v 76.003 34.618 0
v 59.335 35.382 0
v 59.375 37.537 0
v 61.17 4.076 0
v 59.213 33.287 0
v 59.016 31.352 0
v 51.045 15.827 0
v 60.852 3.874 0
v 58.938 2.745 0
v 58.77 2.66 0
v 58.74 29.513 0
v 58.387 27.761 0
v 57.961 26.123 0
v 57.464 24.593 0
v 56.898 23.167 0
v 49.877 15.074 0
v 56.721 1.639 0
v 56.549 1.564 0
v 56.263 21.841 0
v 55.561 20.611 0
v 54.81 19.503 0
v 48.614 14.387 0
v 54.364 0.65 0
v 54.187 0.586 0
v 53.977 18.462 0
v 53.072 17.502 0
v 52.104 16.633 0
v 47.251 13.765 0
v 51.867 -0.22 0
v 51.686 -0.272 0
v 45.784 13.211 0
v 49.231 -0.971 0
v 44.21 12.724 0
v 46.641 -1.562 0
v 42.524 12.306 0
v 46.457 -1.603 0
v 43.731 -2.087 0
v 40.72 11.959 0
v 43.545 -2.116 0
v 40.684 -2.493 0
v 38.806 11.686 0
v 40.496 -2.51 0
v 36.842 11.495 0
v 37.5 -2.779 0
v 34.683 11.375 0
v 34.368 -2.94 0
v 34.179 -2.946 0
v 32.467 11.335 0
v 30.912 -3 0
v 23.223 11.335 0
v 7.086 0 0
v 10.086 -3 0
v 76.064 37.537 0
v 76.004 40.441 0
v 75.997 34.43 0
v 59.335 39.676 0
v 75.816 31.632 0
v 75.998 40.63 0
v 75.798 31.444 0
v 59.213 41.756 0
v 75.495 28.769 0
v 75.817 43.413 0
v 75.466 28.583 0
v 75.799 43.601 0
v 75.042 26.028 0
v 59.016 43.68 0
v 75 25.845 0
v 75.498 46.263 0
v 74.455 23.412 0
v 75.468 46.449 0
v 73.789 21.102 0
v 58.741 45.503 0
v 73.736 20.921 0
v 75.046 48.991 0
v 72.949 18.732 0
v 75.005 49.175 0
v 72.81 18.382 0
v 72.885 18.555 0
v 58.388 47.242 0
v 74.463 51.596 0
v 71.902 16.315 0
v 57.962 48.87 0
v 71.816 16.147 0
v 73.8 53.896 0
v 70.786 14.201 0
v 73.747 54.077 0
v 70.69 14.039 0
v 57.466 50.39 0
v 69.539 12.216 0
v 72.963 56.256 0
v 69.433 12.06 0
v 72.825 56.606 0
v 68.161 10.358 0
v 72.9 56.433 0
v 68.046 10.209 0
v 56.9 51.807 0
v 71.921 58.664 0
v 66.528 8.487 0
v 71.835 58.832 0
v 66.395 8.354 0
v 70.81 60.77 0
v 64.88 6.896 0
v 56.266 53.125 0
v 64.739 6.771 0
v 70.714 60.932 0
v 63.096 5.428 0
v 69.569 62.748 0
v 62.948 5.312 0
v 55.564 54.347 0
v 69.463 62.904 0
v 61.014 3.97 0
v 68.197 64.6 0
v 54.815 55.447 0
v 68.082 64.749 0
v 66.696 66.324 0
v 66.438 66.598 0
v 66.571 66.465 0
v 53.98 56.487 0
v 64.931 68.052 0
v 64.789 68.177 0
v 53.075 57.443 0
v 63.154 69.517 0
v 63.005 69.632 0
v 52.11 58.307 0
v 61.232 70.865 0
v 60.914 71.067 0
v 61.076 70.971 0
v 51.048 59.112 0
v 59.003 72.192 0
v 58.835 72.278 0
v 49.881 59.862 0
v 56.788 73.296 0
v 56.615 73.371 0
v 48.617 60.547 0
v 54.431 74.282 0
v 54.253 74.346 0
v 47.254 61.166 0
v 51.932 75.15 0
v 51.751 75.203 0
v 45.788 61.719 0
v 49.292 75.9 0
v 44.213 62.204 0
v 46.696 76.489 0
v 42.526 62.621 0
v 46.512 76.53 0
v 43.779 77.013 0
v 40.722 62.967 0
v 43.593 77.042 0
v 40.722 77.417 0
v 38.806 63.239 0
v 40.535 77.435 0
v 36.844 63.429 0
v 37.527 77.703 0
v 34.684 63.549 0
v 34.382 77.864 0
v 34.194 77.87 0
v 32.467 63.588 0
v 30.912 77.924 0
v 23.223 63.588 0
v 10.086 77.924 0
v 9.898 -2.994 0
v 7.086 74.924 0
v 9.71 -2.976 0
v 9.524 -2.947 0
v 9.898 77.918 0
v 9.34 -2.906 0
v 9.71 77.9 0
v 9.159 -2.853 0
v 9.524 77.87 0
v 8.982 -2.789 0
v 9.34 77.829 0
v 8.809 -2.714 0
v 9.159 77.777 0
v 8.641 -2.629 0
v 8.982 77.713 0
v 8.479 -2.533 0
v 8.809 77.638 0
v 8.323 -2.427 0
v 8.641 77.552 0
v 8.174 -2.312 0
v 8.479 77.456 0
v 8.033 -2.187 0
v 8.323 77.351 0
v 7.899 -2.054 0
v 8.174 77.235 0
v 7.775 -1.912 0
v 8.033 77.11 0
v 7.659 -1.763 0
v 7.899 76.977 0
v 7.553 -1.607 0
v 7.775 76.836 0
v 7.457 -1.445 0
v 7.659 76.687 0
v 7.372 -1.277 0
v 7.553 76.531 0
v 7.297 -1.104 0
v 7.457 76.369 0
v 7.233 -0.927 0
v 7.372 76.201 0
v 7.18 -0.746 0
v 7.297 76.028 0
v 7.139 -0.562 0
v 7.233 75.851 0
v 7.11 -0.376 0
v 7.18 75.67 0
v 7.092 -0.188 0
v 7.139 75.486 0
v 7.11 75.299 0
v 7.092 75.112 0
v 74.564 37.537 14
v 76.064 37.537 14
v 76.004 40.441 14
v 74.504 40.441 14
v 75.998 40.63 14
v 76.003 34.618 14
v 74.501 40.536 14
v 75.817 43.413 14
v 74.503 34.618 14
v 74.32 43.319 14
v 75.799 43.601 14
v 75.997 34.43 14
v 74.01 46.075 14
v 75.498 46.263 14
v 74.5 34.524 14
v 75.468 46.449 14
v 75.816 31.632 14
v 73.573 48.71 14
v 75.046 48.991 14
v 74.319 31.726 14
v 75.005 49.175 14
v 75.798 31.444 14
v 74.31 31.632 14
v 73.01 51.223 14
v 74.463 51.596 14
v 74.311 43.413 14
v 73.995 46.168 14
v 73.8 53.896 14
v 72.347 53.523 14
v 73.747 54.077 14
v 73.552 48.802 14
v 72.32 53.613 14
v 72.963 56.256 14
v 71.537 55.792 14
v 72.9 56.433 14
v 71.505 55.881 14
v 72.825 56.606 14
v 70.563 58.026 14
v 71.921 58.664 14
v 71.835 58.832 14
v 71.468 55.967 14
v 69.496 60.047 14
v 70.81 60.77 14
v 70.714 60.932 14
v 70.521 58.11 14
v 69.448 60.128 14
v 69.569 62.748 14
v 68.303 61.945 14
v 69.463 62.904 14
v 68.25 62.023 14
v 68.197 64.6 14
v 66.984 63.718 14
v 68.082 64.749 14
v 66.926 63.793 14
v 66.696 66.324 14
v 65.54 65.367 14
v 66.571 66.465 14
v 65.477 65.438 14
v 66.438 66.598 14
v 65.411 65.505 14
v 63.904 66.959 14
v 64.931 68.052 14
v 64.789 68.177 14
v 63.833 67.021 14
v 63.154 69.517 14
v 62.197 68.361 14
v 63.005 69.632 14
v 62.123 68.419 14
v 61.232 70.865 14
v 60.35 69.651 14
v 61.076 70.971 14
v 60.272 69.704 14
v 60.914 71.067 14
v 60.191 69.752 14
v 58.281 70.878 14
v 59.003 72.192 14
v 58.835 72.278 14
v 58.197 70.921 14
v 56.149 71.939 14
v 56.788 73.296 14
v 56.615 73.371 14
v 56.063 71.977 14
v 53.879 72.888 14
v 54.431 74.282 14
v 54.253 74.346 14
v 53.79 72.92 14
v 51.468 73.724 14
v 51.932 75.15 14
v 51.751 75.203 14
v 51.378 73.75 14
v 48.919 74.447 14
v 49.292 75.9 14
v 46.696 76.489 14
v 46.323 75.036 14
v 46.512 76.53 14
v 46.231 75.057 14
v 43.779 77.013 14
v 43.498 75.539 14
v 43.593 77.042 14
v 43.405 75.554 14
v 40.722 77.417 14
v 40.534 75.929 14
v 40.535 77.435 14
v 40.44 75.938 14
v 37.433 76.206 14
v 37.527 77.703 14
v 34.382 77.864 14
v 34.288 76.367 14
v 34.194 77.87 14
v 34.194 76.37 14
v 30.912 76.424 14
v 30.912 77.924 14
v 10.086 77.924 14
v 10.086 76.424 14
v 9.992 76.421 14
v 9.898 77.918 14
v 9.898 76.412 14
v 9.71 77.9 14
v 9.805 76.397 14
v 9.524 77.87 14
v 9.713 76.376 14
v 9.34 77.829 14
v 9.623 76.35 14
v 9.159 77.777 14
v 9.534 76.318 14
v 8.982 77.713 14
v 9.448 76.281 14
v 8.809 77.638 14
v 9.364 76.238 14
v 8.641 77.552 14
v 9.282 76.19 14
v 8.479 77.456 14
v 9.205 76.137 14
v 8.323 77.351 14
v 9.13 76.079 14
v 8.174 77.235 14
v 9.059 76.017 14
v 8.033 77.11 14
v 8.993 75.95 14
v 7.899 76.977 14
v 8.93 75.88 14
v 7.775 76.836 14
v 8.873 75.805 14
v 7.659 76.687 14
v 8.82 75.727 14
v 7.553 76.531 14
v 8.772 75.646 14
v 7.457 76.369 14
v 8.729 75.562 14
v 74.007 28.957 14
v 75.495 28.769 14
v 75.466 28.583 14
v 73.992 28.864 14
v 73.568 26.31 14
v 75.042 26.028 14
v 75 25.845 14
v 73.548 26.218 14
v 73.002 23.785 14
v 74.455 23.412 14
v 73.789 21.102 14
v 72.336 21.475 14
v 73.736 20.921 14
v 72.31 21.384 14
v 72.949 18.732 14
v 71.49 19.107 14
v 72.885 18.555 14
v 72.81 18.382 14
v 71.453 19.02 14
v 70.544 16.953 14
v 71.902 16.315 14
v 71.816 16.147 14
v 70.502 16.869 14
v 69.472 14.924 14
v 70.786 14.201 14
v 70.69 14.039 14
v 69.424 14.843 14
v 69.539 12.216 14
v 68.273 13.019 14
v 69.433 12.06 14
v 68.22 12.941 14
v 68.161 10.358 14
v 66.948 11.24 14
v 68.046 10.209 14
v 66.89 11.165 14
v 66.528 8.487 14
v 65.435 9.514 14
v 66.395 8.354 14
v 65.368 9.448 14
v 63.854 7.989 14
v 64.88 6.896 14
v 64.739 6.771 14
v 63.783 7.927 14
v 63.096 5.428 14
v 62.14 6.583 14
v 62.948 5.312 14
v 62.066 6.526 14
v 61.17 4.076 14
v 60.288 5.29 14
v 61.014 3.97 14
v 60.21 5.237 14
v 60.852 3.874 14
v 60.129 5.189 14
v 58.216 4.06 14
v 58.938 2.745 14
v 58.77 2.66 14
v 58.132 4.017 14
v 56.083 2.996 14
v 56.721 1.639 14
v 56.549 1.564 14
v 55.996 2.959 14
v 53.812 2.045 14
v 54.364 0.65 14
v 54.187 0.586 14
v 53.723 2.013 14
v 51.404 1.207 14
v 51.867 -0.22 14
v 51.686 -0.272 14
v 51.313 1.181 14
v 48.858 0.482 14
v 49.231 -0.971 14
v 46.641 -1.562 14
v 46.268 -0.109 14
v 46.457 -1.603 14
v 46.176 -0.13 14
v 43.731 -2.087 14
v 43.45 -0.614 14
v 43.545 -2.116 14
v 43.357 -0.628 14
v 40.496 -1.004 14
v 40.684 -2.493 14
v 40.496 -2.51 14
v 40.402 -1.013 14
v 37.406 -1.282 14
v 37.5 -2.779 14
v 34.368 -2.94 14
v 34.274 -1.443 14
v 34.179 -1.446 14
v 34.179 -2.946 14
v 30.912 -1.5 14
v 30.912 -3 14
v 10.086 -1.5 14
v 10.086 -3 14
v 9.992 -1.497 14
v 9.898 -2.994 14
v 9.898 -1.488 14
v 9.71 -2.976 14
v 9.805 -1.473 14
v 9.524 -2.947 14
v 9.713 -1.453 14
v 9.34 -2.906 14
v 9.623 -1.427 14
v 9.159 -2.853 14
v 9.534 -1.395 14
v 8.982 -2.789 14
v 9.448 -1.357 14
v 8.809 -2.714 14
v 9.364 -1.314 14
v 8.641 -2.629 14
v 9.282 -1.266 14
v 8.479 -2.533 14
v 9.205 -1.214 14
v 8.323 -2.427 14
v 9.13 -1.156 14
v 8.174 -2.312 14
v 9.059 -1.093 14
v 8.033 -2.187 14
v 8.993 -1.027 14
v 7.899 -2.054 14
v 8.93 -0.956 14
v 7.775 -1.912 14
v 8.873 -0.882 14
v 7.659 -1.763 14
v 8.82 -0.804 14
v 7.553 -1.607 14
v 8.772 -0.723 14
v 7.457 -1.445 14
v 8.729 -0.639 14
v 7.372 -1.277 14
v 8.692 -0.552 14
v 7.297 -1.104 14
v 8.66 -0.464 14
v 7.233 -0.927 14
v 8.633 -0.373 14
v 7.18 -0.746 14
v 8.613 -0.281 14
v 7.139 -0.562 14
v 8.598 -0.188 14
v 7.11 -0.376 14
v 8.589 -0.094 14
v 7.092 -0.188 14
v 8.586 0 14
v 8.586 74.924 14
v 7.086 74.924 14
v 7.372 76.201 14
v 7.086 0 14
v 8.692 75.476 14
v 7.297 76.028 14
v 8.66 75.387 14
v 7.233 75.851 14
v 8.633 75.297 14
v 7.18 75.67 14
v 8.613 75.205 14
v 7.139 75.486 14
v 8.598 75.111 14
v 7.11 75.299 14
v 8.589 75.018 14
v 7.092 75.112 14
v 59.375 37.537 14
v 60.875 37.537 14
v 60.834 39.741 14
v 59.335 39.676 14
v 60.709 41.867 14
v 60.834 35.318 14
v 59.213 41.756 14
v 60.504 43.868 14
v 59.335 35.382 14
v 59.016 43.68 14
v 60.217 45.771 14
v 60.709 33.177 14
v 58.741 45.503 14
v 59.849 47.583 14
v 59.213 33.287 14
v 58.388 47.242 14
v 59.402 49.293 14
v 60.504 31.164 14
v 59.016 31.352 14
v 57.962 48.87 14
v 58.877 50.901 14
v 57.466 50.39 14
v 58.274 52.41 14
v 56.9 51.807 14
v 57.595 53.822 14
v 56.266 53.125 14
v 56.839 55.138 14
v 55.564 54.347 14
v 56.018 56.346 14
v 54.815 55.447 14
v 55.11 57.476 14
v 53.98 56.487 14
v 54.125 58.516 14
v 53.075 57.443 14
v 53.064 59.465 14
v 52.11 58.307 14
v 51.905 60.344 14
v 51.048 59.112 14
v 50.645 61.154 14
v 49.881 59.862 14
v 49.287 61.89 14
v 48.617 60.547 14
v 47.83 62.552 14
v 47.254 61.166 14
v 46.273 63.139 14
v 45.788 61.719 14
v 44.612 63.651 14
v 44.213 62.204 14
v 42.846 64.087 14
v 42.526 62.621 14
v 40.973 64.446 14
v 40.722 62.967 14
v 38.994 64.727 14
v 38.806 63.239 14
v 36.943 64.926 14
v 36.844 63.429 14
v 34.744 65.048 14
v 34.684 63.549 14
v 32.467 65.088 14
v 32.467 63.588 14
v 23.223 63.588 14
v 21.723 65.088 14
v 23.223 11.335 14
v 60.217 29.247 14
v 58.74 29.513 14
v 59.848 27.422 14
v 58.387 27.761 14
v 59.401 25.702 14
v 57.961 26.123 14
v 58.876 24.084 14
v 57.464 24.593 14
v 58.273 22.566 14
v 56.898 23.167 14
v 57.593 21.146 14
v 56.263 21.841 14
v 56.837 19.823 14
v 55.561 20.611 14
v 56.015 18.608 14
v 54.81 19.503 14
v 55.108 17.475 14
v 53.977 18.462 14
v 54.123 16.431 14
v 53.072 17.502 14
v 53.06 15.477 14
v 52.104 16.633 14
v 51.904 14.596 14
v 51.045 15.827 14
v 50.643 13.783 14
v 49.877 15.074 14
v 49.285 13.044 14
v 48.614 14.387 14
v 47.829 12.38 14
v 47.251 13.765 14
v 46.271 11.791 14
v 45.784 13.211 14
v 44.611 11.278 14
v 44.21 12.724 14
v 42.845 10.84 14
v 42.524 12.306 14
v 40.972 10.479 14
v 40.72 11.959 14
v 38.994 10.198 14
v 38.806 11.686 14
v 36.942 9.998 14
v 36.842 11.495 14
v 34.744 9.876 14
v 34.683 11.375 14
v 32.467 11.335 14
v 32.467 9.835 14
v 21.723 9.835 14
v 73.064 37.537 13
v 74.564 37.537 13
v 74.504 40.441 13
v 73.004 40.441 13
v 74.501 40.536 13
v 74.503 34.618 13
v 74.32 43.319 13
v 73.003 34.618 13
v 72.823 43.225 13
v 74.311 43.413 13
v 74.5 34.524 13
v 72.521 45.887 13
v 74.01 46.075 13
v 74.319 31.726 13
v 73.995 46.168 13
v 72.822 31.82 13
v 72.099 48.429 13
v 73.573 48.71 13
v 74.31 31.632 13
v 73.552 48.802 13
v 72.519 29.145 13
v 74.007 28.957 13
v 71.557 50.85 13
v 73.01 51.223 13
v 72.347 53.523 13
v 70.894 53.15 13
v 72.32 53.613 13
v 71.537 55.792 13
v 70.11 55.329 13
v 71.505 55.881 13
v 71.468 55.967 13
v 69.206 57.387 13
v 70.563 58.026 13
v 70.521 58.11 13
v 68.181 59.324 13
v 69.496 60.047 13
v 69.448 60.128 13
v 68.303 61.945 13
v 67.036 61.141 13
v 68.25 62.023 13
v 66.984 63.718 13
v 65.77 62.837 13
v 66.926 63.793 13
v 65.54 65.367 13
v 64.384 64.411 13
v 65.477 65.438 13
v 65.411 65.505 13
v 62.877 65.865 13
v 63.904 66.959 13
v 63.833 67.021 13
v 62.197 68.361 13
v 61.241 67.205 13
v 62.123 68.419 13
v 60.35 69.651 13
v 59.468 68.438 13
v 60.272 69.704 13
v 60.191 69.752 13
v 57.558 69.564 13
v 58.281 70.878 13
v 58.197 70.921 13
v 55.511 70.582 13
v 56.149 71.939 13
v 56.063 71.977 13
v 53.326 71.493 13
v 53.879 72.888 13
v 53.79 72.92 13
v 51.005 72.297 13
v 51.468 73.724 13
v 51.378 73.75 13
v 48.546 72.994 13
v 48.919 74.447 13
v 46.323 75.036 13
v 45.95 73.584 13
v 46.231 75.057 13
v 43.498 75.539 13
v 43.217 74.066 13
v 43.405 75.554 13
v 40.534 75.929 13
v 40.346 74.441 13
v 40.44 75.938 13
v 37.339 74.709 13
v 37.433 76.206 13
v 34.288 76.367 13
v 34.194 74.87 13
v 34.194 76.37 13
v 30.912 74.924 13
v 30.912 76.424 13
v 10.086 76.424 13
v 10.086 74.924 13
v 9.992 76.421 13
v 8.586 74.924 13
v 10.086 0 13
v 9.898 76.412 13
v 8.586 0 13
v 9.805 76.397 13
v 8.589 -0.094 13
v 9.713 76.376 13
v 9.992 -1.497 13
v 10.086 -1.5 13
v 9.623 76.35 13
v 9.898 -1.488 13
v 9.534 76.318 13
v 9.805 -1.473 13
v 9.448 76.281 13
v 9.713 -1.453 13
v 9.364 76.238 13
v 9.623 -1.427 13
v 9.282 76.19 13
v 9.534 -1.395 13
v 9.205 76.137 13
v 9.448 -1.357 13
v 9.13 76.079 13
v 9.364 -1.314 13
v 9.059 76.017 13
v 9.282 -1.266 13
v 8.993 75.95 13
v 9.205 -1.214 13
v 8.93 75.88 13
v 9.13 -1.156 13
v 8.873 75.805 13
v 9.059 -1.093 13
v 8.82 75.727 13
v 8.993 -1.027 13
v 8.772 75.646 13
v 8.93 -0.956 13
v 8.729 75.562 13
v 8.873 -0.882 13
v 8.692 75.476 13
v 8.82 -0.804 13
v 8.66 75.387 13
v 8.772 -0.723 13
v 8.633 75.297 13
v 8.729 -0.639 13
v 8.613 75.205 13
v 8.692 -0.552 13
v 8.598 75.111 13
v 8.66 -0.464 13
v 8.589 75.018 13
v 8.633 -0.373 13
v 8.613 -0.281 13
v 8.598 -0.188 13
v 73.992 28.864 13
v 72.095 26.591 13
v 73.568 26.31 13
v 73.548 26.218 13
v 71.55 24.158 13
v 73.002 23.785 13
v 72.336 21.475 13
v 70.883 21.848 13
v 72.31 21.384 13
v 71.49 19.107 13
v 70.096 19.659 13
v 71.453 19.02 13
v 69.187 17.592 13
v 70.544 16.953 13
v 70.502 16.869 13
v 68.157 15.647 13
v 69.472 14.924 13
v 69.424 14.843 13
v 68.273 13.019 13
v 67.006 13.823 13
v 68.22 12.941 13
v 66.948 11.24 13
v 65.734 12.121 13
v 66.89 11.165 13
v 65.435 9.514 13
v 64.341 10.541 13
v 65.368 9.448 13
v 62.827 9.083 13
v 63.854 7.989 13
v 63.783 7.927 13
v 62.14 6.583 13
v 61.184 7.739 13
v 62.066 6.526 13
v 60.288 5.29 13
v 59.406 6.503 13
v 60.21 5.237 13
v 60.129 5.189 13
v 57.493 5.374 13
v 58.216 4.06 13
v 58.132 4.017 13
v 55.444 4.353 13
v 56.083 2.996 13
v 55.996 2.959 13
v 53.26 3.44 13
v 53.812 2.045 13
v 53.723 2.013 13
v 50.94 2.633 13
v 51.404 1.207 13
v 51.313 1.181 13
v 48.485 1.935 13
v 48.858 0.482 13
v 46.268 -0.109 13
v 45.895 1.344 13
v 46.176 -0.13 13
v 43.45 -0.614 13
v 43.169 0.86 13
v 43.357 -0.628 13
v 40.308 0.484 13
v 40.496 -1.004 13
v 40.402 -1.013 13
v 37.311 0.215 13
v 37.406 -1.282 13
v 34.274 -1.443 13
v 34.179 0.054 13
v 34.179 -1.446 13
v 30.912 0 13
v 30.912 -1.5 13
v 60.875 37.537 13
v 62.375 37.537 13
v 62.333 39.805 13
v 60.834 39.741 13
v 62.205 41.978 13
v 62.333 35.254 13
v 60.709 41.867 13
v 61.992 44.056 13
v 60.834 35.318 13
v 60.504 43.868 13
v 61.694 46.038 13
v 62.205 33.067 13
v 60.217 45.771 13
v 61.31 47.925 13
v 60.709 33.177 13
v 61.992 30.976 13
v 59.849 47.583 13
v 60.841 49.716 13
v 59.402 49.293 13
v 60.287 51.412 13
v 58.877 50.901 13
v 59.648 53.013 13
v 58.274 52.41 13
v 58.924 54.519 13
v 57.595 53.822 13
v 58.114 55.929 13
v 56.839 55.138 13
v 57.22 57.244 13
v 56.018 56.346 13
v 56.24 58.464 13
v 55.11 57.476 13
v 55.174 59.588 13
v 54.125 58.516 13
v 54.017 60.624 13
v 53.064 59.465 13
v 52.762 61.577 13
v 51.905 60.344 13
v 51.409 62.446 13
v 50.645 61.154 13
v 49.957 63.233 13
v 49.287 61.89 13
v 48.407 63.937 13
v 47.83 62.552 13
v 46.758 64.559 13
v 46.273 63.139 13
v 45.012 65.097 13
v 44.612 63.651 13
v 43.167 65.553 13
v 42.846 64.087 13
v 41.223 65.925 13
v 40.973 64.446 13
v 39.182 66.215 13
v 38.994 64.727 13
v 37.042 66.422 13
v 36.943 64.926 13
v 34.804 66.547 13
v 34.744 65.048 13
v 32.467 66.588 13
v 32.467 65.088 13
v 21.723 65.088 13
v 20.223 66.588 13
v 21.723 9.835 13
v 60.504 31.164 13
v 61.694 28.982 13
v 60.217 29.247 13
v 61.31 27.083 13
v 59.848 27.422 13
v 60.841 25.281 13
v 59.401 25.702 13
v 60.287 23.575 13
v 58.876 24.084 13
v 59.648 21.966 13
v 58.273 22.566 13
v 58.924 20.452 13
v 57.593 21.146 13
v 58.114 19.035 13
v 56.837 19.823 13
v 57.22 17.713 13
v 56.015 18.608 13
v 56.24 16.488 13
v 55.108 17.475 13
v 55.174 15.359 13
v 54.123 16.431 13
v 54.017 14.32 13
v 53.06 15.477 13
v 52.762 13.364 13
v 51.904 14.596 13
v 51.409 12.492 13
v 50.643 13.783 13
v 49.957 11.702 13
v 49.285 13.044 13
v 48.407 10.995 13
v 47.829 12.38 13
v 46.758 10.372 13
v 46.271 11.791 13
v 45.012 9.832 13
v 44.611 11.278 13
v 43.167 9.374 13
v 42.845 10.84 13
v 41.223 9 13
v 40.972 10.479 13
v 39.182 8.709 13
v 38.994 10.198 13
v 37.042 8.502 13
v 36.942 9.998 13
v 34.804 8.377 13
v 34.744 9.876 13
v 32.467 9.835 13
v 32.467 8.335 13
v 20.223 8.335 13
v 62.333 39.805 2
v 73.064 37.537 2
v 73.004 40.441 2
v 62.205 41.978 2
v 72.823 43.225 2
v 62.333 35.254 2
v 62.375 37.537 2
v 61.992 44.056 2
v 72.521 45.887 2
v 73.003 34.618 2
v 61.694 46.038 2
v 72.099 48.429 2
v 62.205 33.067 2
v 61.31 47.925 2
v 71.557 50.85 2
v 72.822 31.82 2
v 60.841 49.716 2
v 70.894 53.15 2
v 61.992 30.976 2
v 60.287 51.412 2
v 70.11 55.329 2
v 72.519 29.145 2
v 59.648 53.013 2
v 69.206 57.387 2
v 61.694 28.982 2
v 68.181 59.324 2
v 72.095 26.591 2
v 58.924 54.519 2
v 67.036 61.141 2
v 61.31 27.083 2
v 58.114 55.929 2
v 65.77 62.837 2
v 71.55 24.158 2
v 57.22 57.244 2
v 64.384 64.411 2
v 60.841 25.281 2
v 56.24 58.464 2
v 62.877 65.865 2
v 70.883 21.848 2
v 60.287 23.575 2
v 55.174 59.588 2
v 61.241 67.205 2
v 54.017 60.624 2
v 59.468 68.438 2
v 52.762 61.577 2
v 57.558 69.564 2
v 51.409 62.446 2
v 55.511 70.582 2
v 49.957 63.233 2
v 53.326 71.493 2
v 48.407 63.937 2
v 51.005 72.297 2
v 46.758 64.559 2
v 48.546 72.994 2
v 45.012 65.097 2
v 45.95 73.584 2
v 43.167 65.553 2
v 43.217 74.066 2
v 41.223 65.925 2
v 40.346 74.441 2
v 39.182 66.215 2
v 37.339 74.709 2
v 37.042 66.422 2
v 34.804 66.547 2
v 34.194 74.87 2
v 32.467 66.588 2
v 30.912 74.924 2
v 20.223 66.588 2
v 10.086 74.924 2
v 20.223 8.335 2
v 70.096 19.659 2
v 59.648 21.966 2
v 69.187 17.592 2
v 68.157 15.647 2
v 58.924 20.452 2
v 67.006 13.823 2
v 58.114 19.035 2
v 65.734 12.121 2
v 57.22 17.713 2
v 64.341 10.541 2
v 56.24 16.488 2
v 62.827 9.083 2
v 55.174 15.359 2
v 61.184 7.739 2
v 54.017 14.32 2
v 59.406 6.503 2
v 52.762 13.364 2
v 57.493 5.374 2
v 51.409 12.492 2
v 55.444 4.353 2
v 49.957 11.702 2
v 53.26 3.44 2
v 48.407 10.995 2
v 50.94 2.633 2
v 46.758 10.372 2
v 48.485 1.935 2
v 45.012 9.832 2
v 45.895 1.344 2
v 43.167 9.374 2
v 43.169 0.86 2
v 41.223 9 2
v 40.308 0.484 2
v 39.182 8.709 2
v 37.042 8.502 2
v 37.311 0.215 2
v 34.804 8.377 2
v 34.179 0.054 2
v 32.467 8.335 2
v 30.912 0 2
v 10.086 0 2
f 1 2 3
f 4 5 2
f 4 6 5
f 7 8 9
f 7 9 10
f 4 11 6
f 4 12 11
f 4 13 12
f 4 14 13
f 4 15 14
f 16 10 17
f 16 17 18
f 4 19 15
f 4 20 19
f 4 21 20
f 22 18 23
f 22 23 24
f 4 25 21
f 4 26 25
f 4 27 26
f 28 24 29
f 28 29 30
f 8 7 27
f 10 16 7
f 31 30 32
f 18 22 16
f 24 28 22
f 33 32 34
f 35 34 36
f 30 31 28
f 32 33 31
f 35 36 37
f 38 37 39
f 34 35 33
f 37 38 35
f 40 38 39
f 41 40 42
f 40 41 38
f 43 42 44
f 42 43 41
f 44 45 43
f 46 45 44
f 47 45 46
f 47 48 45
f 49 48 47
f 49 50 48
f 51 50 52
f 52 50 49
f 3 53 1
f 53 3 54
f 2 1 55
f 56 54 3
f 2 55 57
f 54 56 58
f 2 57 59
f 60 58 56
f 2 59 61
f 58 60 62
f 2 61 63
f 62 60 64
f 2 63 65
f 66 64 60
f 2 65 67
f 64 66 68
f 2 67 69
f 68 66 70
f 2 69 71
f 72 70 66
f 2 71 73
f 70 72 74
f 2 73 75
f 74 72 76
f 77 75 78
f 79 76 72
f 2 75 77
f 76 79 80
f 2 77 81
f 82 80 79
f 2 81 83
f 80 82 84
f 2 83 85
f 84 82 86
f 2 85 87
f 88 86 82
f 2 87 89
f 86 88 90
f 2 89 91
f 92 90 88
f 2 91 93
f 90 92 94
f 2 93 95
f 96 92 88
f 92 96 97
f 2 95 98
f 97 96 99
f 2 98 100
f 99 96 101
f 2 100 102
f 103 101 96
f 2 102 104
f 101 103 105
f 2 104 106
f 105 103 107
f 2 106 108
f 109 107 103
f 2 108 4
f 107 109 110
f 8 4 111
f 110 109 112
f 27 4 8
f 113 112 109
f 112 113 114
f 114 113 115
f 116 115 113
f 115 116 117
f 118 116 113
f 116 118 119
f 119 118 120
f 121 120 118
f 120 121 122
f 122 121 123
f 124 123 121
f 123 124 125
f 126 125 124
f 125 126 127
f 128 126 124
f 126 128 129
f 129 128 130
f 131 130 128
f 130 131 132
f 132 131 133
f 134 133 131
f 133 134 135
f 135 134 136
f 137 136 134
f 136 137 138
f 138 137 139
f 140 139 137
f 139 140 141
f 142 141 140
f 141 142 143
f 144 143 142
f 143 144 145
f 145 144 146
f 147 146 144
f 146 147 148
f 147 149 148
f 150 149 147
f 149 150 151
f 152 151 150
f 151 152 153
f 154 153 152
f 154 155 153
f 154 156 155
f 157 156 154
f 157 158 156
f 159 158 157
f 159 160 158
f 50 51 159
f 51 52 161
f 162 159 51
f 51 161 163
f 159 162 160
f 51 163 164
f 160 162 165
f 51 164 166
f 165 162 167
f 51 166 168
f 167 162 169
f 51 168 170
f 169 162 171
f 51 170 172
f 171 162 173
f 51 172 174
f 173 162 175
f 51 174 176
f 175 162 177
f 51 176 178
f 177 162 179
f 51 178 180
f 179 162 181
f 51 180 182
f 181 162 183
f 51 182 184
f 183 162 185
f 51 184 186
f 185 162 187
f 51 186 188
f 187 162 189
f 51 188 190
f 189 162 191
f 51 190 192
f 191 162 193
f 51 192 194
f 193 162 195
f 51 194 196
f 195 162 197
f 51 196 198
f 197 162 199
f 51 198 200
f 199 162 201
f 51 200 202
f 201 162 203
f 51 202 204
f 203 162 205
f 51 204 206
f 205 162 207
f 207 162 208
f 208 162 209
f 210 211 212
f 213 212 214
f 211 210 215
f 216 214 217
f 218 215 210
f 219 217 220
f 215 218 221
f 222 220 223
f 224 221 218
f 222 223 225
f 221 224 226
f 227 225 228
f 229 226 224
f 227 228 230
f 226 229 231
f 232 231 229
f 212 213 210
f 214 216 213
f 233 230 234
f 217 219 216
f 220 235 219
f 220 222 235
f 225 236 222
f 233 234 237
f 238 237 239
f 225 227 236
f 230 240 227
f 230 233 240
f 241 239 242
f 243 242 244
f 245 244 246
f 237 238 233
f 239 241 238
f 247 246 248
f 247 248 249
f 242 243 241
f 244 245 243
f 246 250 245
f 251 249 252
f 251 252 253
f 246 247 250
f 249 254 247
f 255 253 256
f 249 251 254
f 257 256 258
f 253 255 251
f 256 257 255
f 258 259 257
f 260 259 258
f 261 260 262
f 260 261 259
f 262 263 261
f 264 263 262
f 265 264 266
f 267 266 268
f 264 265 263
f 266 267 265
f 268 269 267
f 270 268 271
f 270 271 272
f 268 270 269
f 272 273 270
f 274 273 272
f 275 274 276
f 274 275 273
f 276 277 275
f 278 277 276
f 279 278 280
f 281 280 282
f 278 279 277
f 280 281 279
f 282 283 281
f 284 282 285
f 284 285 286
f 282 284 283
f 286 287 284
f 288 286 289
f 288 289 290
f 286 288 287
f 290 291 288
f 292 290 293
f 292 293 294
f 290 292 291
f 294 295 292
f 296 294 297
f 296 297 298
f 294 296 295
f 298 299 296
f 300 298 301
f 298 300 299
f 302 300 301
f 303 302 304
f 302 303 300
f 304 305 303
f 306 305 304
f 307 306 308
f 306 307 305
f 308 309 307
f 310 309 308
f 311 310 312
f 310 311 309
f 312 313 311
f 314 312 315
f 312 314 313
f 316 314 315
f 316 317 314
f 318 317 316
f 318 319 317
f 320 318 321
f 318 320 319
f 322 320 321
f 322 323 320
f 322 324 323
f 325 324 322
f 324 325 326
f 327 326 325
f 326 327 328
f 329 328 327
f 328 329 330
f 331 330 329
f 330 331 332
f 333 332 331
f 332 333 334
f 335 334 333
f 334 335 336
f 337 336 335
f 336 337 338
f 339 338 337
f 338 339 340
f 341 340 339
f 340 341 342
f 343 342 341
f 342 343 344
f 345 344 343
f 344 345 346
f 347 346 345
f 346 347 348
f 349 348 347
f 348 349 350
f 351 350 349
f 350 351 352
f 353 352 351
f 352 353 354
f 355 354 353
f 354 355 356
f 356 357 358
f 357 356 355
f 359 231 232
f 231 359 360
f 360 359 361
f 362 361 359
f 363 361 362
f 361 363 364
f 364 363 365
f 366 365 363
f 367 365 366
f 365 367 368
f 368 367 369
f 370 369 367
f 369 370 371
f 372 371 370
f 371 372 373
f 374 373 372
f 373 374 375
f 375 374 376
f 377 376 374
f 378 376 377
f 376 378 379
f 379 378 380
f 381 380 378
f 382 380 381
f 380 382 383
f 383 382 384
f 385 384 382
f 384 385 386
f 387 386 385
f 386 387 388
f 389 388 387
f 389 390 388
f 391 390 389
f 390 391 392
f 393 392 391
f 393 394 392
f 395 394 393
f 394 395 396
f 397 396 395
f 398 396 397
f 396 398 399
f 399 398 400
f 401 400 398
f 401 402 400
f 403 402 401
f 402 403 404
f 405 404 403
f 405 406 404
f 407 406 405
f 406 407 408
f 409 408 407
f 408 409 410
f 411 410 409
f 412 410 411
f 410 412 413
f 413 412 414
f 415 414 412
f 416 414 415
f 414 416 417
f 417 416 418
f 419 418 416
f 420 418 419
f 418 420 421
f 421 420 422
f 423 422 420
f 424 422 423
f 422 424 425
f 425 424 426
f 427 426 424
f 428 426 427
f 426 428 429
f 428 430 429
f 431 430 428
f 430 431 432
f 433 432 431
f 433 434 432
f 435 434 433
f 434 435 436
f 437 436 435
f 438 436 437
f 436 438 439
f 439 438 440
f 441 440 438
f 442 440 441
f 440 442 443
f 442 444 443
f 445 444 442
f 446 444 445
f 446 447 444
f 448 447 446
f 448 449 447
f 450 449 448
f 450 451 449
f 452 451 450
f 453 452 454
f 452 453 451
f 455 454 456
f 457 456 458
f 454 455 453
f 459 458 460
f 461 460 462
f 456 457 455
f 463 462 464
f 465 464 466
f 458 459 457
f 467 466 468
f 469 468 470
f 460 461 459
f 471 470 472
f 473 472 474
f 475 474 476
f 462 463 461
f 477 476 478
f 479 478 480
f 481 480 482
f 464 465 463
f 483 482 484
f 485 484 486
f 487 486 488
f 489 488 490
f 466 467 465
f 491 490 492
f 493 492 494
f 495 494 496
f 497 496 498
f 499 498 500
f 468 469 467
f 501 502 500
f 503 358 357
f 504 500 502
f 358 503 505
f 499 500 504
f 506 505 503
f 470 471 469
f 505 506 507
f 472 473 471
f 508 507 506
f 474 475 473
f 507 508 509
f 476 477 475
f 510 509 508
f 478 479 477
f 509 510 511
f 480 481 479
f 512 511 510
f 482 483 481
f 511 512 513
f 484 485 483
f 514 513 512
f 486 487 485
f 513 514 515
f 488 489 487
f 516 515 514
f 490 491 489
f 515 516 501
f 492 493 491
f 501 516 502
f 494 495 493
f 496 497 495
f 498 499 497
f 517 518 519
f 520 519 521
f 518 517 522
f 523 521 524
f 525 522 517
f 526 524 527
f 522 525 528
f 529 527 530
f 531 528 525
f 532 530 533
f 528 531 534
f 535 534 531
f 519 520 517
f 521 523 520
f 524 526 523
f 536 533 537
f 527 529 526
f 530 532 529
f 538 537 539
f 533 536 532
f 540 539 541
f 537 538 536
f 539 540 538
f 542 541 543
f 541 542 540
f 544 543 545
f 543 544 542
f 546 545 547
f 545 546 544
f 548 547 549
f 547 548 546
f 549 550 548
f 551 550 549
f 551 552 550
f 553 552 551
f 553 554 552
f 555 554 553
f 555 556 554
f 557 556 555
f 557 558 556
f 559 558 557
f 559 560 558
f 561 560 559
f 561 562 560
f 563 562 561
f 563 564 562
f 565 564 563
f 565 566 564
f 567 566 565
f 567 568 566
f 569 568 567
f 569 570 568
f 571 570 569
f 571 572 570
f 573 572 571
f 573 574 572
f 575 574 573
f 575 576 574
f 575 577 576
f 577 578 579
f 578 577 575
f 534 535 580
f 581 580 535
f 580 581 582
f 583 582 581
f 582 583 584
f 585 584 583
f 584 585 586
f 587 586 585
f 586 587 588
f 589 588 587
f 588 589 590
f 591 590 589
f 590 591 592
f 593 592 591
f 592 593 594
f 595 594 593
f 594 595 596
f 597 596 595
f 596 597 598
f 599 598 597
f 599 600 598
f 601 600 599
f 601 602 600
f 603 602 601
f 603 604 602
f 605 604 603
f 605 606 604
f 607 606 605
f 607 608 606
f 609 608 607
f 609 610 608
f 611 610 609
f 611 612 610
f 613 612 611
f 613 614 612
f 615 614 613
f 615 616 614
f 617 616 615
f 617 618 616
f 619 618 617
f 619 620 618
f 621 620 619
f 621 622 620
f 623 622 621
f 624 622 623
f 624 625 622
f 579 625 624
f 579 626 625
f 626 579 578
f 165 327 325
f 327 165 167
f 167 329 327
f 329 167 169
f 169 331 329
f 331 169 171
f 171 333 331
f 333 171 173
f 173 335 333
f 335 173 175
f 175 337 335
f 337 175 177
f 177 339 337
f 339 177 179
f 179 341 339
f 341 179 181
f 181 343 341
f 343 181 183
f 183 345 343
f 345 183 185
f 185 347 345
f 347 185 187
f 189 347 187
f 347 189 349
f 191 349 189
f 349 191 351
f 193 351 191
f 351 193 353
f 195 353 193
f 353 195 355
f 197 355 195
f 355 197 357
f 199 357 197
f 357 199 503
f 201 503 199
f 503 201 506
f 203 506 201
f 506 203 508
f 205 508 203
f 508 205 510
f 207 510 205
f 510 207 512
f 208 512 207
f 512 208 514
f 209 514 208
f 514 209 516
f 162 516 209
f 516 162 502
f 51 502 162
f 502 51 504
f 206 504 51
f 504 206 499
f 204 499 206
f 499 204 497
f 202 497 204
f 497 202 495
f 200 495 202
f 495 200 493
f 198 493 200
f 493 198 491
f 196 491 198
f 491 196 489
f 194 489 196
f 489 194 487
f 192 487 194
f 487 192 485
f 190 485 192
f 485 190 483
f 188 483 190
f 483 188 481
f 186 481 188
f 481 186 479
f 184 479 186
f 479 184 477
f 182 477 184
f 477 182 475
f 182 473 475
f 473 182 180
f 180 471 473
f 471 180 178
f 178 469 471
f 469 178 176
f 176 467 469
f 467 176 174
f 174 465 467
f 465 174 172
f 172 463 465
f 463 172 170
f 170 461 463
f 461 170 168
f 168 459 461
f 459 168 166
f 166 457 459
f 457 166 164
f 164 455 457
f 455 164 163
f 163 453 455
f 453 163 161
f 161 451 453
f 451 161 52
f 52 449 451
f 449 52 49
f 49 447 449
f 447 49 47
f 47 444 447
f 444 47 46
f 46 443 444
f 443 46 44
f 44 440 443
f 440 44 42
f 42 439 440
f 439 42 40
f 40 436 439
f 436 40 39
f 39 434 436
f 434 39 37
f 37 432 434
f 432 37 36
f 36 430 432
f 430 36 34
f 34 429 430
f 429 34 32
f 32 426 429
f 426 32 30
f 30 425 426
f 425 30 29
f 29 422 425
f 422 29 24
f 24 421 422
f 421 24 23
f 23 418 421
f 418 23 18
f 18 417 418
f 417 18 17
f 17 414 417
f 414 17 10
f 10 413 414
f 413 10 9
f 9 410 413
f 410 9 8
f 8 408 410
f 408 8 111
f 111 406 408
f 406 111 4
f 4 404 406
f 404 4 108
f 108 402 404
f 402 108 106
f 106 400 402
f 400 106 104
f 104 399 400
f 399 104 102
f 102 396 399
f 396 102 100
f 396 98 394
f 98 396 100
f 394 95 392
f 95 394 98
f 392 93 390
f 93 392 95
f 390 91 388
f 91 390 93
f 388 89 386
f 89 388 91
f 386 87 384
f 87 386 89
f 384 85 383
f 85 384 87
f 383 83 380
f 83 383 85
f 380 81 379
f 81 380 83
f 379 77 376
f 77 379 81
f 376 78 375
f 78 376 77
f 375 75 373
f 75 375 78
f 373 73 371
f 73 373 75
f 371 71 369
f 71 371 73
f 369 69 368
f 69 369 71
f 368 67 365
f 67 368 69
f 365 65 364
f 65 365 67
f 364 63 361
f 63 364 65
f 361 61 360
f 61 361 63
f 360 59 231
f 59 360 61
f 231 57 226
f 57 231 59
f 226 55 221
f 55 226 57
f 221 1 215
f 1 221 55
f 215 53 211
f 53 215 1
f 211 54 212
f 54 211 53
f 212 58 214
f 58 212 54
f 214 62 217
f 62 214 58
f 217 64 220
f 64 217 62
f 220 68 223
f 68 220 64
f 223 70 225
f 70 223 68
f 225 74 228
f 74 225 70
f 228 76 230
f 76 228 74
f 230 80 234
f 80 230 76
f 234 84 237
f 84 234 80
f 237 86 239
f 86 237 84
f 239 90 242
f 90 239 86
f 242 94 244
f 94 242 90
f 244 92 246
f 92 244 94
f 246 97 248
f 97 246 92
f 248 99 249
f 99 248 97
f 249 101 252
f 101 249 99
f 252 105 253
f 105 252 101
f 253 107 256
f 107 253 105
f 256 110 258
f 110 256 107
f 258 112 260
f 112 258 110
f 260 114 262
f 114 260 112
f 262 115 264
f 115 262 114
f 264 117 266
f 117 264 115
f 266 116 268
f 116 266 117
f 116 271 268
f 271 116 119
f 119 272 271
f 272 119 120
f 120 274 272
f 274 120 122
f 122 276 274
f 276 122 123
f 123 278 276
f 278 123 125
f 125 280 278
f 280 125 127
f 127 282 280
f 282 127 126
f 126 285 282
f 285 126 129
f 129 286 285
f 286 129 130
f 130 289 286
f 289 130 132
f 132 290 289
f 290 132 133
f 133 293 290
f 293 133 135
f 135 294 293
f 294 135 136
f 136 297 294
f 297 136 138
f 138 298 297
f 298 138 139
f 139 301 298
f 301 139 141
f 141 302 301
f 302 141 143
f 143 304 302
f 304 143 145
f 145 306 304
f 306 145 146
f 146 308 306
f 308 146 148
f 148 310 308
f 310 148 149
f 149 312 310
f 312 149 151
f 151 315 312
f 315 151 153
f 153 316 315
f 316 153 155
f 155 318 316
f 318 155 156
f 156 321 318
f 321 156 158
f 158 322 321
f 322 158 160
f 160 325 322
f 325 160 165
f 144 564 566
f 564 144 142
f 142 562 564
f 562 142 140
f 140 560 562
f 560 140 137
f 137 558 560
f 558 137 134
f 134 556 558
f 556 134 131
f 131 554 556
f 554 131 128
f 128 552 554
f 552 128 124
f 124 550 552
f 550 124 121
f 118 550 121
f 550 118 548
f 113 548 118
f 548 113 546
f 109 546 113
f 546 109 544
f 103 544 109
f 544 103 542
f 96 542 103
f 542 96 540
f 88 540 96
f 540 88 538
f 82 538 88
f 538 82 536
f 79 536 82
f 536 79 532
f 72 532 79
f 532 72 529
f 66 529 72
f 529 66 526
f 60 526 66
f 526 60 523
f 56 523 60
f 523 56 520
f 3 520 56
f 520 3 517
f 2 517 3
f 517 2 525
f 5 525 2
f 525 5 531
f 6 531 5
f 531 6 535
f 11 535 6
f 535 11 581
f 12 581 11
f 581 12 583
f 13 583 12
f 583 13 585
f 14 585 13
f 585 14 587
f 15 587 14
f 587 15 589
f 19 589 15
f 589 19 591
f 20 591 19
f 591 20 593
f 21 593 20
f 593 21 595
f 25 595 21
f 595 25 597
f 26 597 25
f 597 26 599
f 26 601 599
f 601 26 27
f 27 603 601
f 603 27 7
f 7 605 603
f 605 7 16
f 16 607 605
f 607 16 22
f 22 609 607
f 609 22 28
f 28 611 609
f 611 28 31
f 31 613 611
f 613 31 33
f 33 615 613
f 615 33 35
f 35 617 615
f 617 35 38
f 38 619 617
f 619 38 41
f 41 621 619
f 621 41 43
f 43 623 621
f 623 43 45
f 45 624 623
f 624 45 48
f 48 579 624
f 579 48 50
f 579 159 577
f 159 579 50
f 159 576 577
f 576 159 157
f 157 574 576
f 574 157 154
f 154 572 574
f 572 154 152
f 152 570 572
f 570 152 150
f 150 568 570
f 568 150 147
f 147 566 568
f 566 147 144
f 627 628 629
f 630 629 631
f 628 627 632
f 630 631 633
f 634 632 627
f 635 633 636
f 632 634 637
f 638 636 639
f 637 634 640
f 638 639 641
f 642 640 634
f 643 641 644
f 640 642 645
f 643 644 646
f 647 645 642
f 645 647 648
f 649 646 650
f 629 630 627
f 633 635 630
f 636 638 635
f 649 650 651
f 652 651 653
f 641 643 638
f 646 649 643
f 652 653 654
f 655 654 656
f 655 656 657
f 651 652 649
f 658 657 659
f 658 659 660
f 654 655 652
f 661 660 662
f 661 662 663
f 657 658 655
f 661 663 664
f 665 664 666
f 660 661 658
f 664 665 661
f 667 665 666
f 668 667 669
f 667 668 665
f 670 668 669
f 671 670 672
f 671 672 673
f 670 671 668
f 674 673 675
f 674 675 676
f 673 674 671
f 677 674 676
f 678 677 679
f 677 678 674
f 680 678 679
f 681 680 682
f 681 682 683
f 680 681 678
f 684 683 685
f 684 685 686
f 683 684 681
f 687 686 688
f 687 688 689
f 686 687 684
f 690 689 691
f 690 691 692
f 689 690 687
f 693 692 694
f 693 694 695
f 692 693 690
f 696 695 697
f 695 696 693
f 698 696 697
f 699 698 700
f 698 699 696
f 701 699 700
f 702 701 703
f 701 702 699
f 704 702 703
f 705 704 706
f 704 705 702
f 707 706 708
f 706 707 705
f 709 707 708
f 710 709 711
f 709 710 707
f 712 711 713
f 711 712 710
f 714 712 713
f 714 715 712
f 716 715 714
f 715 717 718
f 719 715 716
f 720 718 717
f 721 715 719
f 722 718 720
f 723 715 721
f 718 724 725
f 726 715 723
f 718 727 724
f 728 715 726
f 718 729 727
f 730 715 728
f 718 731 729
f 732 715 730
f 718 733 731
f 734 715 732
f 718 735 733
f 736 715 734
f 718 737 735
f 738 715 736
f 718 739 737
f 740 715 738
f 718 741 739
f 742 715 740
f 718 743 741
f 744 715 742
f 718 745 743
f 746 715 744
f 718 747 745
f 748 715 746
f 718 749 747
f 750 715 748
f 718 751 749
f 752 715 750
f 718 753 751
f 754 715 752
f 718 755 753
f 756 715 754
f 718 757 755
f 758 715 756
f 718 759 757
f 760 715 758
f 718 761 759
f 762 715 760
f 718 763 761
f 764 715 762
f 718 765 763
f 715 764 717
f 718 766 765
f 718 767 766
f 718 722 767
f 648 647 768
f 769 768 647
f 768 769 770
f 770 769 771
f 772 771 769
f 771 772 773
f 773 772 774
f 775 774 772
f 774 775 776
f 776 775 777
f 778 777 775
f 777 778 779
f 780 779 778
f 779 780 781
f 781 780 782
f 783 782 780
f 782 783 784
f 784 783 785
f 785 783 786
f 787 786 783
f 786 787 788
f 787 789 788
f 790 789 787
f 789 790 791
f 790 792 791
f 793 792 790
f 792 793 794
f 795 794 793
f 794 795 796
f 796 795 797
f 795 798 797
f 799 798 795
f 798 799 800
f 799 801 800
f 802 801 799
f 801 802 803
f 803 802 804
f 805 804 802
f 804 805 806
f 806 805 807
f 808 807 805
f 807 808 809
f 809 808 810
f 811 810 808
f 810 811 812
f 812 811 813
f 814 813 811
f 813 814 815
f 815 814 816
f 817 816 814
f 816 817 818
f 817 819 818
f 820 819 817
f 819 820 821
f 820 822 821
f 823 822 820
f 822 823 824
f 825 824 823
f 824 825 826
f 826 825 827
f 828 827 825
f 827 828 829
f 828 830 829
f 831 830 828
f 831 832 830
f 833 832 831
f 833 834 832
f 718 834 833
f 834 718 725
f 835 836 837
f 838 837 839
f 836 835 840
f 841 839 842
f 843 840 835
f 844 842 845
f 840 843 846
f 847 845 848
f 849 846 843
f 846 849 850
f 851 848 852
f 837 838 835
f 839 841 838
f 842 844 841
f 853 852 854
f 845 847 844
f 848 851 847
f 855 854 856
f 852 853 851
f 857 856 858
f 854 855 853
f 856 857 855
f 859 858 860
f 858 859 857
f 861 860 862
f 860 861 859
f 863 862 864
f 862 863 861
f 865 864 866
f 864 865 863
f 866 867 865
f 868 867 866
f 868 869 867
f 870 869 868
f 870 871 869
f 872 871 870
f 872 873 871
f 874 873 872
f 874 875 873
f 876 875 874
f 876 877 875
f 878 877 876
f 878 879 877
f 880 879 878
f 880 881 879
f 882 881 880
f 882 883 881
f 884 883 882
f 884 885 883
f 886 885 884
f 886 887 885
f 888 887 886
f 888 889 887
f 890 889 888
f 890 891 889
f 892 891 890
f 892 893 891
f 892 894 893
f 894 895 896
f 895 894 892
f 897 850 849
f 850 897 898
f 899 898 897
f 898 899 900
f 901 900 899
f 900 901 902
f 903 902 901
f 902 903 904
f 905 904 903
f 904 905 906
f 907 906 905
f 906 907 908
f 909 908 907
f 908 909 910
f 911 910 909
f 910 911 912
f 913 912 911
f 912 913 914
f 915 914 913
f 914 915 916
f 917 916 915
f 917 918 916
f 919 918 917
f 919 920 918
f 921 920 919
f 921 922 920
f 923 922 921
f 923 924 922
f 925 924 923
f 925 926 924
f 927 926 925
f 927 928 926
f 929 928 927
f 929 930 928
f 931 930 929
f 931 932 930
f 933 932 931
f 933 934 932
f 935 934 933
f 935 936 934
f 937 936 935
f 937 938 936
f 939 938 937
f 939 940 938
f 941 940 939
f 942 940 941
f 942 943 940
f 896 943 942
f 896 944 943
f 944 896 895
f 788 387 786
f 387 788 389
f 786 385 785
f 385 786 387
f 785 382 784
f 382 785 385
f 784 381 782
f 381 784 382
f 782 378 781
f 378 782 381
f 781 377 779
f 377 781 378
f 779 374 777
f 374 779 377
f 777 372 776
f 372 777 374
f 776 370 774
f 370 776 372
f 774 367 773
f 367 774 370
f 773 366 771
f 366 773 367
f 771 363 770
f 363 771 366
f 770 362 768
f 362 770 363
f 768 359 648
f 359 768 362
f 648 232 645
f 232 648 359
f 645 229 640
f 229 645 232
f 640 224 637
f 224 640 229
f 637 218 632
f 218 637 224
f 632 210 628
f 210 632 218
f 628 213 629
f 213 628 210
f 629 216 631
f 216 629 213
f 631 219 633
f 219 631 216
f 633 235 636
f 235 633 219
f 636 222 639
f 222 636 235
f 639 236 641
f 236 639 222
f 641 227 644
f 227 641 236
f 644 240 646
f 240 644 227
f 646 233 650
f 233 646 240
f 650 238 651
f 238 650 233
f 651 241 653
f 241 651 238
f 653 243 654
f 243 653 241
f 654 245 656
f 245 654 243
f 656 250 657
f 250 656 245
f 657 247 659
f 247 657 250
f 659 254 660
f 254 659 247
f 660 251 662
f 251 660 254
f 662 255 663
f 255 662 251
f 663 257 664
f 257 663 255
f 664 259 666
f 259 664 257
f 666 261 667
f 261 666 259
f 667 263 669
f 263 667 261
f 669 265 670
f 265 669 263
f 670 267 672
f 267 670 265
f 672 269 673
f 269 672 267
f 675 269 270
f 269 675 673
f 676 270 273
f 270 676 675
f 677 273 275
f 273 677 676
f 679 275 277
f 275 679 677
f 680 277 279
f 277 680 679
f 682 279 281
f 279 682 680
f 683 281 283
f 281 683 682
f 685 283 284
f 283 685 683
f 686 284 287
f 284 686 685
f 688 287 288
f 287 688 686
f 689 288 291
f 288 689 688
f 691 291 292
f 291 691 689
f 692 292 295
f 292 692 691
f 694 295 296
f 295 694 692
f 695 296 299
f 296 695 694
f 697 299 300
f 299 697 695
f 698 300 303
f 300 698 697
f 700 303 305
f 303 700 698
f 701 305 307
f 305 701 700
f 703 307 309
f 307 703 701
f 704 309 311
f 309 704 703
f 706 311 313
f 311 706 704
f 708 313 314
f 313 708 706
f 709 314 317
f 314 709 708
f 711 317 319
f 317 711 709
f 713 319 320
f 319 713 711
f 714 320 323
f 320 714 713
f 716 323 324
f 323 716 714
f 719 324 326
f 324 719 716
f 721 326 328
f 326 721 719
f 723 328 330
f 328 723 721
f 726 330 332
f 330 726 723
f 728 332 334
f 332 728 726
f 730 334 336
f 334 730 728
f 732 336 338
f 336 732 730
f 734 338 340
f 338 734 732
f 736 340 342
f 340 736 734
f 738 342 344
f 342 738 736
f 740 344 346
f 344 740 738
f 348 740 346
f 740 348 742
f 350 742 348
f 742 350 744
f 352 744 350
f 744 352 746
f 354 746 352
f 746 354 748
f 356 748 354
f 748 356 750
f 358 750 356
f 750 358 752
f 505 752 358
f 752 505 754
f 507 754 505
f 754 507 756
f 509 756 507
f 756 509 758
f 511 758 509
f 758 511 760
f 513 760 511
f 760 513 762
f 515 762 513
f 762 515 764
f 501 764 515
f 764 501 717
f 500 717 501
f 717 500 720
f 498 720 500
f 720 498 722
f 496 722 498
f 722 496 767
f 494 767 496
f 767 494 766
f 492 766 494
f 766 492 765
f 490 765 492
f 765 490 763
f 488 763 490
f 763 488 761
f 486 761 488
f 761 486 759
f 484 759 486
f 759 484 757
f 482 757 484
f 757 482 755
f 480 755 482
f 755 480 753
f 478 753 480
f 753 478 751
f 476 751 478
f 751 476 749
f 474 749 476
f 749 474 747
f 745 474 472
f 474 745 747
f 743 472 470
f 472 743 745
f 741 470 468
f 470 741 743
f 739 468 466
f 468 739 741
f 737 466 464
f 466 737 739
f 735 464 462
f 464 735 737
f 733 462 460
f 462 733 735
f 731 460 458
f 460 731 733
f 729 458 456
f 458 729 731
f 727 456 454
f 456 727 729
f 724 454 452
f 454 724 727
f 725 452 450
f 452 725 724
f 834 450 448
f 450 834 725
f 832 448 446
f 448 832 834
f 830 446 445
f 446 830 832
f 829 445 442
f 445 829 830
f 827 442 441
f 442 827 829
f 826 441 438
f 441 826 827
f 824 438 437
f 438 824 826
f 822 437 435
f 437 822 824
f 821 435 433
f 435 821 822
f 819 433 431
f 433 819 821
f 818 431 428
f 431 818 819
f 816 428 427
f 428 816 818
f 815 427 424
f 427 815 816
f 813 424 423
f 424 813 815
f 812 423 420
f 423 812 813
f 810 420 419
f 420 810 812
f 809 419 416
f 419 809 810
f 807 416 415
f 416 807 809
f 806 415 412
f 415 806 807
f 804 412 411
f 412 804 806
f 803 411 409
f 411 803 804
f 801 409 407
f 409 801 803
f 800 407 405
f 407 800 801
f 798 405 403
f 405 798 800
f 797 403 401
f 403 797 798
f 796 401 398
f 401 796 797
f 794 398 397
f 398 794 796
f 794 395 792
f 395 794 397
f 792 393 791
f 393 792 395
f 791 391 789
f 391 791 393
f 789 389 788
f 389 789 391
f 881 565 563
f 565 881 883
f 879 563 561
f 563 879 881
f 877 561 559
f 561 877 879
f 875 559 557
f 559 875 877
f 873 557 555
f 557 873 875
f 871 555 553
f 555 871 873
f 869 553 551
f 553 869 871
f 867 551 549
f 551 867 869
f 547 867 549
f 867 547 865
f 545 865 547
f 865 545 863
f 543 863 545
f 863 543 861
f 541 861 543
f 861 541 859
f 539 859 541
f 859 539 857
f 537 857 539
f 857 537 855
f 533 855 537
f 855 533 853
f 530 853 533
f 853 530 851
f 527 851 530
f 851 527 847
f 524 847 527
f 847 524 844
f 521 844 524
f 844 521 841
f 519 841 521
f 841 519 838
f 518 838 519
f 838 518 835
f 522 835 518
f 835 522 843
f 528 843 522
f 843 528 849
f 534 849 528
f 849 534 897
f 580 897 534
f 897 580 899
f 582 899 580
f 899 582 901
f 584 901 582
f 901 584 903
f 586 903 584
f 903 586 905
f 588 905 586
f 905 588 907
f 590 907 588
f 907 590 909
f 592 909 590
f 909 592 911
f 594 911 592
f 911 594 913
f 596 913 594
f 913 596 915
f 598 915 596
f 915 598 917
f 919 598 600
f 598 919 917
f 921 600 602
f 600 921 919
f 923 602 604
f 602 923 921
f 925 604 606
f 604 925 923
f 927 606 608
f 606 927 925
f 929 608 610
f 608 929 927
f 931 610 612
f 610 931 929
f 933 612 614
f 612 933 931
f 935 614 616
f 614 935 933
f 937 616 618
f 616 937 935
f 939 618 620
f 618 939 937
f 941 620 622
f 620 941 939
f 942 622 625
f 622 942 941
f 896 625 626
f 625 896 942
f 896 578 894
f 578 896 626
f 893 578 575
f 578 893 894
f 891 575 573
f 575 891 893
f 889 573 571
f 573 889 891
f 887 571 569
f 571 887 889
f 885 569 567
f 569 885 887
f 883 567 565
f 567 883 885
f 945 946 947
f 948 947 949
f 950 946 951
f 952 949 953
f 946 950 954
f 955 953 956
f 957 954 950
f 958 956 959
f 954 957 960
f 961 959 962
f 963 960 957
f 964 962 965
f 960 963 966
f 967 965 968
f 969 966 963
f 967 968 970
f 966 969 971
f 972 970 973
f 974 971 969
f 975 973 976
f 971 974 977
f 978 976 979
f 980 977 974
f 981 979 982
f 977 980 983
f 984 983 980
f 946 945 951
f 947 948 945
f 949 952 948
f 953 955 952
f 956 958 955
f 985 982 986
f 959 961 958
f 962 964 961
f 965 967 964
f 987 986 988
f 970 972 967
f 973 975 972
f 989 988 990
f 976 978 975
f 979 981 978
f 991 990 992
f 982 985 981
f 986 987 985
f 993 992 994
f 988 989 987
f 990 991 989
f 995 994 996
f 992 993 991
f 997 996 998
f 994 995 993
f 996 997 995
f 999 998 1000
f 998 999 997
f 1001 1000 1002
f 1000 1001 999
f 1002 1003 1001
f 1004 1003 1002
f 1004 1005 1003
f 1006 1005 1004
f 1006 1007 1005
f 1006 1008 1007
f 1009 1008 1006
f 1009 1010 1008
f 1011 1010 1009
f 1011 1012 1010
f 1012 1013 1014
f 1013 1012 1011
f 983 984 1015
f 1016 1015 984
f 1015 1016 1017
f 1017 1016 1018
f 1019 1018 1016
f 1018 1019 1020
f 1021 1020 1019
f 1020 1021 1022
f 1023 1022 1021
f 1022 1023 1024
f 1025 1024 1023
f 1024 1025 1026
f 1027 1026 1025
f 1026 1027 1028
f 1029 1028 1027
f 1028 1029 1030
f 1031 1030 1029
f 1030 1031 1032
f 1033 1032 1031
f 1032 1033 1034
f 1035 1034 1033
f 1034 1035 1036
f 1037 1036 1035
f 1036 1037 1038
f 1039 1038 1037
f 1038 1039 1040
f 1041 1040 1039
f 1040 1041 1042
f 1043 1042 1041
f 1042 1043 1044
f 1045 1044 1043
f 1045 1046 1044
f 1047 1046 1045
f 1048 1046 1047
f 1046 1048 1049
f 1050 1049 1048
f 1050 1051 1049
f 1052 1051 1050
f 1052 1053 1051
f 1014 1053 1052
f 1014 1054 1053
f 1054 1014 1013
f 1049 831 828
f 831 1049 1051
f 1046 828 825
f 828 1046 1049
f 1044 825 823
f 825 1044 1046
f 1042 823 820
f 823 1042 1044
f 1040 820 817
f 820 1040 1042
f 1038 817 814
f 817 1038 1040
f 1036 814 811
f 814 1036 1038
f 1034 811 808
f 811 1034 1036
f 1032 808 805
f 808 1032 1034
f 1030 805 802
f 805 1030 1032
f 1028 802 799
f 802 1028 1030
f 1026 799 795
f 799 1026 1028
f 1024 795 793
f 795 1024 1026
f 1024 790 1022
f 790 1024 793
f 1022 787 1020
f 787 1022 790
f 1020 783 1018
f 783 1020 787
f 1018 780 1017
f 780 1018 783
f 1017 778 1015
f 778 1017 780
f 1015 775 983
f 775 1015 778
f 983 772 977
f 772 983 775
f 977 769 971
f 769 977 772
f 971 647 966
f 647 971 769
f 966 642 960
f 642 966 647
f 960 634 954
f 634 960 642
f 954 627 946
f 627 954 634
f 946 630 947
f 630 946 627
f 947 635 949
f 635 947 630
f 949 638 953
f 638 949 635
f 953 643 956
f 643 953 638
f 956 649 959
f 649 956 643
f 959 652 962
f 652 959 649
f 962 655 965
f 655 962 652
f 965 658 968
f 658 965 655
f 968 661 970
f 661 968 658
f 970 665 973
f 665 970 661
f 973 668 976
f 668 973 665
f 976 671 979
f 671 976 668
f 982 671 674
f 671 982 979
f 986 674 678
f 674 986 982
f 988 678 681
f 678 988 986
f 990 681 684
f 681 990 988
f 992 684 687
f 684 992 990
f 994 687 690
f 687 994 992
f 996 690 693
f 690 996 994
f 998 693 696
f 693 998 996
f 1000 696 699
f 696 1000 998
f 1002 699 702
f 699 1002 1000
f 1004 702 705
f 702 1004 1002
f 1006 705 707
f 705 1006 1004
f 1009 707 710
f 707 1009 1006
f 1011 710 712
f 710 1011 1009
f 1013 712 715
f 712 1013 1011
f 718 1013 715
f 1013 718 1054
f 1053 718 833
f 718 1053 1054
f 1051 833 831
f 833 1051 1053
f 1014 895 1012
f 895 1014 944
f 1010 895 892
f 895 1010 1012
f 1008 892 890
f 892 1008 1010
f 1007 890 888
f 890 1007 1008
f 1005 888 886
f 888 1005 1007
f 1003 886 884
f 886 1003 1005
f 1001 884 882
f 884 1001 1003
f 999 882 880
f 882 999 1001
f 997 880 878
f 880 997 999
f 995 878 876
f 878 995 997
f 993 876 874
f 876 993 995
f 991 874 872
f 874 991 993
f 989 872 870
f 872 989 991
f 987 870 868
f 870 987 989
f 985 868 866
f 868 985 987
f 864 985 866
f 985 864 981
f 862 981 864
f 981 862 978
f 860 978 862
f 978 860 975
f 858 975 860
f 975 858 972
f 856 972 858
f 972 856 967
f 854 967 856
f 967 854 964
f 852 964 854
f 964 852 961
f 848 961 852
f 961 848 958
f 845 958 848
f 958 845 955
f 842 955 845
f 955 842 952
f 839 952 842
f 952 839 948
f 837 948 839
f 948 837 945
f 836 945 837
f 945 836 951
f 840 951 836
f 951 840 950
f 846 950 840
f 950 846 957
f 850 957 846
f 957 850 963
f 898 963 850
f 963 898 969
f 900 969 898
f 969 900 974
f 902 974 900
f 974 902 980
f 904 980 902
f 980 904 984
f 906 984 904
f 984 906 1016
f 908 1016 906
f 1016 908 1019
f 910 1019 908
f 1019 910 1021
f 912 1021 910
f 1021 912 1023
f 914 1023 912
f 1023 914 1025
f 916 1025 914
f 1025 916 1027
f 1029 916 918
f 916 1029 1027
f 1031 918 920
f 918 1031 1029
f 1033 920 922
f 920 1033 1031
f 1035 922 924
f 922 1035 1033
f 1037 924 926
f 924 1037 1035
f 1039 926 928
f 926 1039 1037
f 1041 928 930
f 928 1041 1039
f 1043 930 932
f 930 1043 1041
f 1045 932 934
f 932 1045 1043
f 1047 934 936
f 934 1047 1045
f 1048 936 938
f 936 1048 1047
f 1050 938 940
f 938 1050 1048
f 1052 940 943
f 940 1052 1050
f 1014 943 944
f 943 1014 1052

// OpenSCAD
//Sign body maker V3 - bigclivedotcom
letter = "D"; //Sign character to make
style = "Noto Mono"; //See "Help" and "Font List"
size = 80; //Size of character (height)
depth = 14; //Depth of sign character
$fn=100; //Curve facets - higher is smoother
walls = 3; //Side wall thickness
base=2; //Base thickness (-1 for open back)
face = 1; //Face thickness
//Don't change variables below here
sized=size-(2*walls);
difference(){
     linear_extrude(height=depth)
	  minkowski(){
	  text(letter,sized,style);
	  circle(walls);
     }
//Lip for front face (half wall thickness)
     translate([0,0,depth-face])
	  linear_extrude(height=2*face)
	  minkowski(){
	  text(letter,sized,style);
	  circle(walls/2);
     }
//hollow core of letter
     translate([0,0,base])
	  linear_extrude(height=depth+2)
	  text(letter,sized,style);
}
